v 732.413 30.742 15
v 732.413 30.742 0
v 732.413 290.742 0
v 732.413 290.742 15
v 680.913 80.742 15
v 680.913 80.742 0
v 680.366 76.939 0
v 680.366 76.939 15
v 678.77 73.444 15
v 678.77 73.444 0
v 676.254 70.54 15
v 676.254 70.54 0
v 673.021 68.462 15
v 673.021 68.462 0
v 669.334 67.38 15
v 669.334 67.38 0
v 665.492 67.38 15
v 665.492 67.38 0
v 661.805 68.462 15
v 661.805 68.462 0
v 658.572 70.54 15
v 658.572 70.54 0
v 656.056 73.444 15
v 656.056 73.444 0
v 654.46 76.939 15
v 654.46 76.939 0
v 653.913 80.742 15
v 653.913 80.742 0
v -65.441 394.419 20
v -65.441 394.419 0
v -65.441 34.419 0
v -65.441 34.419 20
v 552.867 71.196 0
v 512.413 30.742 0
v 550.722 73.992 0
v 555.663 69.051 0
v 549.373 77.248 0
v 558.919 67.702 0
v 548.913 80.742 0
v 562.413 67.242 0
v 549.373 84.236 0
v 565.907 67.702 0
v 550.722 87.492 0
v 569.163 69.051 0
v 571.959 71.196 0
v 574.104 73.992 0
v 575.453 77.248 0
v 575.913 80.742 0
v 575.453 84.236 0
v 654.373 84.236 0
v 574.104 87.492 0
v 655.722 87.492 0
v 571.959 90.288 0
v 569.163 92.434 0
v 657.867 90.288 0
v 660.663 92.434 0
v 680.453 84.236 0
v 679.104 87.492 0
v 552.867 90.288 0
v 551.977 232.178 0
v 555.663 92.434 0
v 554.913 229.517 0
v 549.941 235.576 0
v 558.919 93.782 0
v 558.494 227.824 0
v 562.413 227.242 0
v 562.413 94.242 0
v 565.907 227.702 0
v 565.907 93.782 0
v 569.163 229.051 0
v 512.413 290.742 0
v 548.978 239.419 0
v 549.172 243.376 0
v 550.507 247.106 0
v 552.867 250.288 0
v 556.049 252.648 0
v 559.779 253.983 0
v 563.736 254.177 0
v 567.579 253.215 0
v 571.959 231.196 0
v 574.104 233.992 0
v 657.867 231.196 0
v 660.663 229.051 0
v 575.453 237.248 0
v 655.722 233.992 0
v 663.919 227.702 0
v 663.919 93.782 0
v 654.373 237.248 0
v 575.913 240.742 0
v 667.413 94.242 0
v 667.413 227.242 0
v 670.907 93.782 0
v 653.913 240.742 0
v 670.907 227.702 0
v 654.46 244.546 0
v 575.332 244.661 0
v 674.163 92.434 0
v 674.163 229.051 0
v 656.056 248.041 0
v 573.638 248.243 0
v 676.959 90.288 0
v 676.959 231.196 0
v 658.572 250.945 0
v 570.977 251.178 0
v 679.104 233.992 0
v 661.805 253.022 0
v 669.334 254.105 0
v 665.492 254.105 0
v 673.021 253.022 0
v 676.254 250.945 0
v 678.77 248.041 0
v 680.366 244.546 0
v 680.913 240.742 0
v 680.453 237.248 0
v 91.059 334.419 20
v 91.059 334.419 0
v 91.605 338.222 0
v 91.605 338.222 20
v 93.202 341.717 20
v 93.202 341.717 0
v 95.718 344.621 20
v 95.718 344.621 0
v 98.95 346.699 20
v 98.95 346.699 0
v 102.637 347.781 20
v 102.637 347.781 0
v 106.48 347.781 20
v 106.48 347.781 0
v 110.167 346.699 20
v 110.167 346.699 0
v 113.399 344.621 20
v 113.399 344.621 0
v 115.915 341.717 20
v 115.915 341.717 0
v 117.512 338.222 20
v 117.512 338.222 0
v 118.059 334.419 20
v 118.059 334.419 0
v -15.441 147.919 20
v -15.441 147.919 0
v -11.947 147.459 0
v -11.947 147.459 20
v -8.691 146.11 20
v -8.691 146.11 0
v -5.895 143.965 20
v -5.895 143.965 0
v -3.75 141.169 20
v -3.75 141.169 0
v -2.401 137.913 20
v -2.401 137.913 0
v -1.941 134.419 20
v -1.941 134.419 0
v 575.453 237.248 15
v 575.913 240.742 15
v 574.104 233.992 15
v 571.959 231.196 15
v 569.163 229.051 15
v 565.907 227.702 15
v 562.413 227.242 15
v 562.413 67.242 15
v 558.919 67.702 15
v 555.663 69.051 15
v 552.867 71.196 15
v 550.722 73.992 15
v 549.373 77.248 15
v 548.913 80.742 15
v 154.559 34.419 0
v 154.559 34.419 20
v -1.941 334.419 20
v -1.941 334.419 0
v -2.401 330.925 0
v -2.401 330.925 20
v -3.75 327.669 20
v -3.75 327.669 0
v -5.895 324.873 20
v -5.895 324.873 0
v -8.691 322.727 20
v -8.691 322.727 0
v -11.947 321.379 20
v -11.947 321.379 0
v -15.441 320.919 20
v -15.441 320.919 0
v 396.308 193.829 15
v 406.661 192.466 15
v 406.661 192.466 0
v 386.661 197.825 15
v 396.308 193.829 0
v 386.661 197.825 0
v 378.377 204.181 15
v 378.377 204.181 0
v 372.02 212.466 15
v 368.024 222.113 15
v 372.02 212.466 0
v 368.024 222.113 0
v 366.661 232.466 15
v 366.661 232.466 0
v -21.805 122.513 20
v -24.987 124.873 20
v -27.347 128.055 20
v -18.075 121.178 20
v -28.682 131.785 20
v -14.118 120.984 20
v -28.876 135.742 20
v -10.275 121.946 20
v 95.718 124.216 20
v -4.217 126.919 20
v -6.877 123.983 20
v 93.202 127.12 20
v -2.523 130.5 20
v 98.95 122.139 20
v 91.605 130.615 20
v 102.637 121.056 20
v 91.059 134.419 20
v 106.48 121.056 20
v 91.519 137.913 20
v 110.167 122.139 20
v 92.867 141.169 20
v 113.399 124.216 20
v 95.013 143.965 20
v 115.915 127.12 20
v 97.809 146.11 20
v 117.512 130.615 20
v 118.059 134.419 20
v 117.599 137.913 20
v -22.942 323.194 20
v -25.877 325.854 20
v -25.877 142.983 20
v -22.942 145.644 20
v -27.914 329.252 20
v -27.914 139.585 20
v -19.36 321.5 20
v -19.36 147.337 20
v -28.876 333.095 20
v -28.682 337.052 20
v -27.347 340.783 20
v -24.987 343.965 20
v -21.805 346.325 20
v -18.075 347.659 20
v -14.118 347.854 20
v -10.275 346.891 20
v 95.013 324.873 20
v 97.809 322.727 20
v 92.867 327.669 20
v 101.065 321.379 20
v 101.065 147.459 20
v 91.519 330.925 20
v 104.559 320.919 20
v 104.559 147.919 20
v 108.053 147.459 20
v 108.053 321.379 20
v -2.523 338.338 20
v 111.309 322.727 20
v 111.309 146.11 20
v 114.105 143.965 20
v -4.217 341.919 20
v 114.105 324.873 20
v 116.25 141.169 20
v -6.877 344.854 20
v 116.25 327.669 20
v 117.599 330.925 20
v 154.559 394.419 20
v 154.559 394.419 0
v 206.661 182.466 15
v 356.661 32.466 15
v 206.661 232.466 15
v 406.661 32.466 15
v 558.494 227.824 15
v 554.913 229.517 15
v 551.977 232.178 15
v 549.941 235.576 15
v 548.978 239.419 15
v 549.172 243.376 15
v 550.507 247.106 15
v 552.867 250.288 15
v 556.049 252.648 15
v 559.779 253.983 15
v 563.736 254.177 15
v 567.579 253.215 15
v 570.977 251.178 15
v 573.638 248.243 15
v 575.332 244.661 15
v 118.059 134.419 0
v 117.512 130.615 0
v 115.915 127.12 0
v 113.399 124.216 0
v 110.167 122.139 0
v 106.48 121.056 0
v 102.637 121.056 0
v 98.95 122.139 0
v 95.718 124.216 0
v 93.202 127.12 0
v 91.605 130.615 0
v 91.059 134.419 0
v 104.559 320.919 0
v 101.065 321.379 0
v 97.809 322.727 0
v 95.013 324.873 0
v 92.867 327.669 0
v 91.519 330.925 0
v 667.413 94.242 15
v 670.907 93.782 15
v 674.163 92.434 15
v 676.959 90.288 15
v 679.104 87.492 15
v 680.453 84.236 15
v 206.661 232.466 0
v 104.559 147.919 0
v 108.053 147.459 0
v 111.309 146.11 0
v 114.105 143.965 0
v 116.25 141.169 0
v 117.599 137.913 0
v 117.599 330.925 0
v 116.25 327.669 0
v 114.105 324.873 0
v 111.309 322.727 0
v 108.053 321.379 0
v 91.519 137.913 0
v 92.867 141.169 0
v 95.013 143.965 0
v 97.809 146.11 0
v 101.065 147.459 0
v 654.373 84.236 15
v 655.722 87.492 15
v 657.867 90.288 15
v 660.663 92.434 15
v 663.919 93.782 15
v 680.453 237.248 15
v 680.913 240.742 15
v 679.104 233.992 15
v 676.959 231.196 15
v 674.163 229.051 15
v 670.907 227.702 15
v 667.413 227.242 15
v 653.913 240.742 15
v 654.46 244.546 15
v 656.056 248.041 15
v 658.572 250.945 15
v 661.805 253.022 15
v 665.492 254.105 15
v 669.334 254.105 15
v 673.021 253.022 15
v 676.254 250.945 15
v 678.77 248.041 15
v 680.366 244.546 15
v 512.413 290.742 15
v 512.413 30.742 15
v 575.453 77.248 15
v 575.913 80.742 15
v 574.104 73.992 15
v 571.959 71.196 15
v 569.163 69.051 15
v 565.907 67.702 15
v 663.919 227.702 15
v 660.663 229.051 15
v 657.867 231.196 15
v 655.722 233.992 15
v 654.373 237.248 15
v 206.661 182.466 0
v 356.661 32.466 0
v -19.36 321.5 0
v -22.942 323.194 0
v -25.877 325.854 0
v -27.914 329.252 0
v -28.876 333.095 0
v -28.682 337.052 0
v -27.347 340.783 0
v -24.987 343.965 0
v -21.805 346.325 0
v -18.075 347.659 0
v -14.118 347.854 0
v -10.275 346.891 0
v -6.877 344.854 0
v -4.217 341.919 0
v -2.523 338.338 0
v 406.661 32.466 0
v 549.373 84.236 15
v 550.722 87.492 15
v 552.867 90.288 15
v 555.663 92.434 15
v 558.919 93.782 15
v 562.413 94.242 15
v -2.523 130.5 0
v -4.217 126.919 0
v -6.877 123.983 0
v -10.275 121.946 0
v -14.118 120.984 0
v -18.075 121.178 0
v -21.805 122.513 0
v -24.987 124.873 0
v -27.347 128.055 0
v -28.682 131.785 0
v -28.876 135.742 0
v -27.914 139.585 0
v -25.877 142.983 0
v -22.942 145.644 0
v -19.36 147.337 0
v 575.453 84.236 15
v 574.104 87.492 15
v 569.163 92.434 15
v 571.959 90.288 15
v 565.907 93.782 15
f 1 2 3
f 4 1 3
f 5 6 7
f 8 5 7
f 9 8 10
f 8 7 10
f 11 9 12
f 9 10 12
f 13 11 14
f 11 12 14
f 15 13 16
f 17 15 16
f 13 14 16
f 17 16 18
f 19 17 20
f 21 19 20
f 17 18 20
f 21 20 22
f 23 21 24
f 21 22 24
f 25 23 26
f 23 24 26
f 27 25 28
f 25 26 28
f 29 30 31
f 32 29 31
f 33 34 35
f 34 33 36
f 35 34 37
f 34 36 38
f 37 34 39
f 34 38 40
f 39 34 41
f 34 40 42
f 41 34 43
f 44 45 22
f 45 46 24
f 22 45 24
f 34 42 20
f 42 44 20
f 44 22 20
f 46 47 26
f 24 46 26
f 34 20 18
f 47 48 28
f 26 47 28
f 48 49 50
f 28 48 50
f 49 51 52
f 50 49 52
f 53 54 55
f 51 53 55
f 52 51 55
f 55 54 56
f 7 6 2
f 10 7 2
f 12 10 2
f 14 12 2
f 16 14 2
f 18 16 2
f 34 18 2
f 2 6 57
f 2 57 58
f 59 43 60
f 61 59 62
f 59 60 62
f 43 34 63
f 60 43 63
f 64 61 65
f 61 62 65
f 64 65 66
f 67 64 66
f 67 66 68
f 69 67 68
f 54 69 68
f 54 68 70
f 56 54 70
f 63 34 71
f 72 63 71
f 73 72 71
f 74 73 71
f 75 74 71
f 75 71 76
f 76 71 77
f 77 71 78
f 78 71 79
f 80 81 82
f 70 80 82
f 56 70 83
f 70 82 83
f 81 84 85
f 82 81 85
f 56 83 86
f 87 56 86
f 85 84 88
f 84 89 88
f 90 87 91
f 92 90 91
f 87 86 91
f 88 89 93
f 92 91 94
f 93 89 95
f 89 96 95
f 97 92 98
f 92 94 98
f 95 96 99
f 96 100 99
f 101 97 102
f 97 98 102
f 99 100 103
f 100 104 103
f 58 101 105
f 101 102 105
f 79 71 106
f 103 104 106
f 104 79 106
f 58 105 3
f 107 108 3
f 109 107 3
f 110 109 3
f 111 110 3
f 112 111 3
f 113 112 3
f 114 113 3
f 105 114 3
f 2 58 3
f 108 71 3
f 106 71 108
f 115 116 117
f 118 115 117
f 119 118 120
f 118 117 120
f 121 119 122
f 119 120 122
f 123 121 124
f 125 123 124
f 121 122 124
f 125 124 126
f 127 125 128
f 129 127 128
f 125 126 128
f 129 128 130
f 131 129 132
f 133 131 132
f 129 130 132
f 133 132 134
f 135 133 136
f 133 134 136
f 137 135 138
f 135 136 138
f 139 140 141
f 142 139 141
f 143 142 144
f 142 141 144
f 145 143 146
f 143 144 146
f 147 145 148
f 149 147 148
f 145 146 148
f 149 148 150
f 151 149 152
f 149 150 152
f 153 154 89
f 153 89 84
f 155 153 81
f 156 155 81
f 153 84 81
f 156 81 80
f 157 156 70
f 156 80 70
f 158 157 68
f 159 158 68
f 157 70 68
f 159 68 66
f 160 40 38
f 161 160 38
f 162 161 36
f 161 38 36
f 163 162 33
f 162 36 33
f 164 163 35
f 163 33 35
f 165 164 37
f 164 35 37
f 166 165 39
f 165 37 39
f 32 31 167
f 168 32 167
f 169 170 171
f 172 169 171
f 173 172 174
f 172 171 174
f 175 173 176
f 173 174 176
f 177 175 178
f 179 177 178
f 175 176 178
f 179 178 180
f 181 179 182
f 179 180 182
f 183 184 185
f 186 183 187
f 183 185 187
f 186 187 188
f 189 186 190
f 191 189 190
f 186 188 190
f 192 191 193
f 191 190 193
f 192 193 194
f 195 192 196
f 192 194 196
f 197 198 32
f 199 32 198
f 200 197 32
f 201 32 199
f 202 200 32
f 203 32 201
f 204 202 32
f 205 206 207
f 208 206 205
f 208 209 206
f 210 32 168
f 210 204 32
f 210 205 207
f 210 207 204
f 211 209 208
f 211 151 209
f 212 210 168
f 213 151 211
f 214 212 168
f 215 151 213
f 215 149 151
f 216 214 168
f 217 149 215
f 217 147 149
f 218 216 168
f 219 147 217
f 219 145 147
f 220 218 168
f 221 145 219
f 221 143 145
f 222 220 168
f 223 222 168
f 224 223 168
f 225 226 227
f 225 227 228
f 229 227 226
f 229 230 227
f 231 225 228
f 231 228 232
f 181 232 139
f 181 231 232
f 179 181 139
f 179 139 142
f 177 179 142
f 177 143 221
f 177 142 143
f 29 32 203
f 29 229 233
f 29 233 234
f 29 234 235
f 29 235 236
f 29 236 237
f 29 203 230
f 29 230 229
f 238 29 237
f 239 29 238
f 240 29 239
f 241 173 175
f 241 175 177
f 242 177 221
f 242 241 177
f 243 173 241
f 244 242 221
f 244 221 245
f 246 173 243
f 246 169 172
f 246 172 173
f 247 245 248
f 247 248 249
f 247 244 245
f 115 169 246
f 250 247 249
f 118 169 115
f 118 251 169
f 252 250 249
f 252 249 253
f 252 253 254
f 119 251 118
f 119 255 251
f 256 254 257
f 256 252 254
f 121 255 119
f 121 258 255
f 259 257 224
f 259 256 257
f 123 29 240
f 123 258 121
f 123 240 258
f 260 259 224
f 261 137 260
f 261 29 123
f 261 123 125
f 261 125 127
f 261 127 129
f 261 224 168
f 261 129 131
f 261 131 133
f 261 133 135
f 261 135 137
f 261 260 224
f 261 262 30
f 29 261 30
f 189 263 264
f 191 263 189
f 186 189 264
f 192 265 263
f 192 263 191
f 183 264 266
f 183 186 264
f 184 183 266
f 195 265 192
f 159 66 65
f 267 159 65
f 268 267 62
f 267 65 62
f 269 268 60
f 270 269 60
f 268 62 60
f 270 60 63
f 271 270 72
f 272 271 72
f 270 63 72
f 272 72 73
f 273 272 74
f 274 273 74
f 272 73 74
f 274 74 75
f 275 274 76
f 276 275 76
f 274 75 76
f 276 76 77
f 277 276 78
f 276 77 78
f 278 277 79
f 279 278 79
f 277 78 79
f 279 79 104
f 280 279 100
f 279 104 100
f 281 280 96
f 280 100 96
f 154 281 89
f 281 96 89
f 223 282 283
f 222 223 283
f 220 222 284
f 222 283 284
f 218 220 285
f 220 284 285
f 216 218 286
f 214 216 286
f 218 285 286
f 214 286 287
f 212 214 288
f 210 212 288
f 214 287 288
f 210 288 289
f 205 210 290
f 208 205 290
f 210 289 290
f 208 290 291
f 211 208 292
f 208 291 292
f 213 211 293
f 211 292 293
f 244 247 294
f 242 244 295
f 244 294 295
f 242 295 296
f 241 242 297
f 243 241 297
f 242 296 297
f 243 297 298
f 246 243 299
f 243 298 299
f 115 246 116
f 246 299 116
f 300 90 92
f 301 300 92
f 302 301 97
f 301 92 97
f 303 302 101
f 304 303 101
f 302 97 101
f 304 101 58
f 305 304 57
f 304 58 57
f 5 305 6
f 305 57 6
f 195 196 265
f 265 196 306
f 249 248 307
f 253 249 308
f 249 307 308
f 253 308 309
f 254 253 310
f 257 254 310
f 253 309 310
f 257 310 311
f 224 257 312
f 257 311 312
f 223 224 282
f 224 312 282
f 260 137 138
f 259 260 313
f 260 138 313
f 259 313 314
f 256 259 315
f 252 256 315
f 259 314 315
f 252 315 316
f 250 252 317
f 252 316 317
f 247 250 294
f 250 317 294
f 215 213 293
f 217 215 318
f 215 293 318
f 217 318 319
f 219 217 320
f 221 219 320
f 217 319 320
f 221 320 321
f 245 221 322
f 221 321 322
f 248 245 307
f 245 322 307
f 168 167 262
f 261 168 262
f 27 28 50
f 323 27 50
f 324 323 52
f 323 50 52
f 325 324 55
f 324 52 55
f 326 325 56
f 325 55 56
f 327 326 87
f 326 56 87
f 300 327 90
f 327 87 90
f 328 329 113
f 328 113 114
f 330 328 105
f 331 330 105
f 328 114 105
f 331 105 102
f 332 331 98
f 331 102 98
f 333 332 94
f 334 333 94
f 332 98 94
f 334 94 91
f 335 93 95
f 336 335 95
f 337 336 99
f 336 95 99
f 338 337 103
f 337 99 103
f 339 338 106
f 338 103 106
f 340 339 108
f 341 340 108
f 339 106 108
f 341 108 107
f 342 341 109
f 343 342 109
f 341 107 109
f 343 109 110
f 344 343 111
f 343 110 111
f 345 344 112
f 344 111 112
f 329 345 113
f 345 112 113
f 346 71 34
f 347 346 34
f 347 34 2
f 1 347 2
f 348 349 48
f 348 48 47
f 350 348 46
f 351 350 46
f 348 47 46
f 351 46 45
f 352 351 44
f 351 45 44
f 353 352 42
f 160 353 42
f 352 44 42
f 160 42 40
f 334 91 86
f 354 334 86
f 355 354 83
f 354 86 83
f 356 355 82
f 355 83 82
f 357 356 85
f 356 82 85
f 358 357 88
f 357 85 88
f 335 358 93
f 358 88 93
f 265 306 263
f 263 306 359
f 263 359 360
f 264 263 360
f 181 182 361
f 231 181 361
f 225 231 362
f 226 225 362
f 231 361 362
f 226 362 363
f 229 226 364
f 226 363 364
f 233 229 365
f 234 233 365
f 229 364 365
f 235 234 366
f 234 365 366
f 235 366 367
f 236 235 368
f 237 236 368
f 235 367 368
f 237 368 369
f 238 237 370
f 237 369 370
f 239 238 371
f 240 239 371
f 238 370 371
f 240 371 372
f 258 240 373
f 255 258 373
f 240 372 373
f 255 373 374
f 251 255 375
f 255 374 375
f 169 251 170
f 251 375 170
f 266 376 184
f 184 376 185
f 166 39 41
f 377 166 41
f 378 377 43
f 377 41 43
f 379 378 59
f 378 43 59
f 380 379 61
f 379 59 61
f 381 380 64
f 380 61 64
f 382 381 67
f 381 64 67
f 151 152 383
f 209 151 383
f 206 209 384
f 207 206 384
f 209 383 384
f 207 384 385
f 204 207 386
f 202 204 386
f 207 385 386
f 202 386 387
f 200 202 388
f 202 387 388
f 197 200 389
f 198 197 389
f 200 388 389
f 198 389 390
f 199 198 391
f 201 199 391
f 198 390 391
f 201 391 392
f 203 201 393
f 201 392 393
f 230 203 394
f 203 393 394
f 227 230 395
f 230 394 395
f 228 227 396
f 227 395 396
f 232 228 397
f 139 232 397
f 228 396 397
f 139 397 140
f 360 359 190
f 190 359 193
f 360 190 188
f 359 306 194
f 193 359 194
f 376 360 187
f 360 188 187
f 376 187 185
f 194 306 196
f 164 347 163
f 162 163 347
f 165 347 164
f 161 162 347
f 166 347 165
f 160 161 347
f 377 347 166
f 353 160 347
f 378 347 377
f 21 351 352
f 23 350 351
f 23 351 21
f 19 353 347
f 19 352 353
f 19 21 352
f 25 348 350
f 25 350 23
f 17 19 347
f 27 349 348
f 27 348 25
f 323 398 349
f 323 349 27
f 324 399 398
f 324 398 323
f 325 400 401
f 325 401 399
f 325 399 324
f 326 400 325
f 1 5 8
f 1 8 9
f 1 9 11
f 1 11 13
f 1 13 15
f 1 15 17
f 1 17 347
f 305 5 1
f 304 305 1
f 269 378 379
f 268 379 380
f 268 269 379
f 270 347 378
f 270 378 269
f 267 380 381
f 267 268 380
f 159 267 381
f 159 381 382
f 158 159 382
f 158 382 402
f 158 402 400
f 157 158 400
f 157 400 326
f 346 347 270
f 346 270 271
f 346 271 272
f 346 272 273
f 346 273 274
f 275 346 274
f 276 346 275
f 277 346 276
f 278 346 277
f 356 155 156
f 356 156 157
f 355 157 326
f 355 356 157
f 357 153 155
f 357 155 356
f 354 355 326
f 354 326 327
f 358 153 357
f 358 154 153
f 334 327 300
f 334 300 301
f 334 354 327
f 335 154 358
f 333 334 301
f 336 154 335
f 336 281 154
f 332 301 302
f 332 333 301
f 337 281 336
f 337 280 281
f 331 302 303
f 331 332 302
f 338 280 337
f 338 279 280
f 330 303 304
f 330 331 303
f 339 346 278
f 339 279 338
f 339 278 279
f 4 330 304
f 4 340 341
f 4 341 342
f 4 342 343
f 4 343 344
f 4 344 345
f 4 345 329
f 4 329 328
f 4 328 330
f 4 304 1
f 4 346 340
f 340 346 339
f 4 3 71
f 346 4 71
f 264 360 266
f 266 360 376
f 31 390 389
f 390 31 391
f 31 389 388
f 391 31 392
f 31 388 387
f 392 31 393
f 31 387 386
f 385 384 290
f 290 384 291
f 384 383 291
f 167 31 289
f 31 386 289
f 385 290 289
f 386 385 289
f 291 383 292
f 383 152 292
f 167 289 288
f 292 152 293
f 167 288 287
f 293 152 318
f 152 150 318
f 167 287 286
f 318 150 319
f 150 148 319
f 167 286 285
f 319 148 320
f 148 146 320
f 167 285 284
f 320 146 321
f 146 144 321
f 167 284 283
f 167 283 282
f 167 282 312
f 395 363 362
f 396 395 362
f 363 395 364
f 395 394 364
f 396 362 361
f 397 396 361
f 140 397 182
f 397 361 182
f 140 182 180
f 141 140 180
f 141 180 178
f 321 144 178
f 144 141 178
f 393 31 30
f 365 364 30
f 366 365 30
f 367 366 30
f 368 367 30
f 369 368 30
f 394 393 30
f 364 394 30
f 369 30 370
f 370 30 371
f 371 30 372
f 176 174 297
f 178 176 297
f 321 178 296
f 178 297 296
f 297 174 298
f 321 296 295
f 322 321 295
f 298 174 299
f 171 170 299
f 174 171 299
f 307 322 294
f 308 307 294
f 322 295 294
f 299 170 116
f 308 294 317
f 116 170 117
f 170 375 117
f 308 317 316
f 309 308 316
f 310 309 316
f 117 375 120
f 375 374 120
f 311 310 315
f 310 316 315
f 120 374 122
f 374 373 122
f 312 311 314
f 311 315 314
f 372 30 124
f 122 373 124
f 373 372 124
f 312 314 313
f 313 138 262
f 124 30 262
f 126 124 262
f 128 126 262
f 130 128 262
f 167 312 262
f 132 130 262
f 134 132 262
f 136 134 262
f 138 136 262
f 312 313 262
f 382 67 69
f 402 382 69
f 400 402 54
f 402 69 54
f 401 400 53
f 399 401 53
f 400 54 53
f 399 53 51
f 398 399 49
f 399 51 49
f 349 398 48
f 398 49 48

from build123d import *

# Parameters (mm, degrees)
F1_DEPTH = 20
F3_DEPTH = 15


with BuildPart() as f1:
    # F0 (on Top) → F1 (new body)
    with BuildSketch(Plane.XY):
        Polygon((-65.4414370656, 394.4187095761), (-65.4414370656, 34.4187095761), (-15.4414370656, 34.4187095761), (154.5585629344, 34.4187095761), (154.5585629344, 394.4187095761), align=None)
        with BuildLine():
            Line((91.0585629344, 134.4187095761), (-1.9414370656, 134.4187095761))
            ThreePointArc((-1.9414370656, 134.4187095761), (-24.9873786116, 124.8727680301), (-15.4414370656, 147.9187095761))
            Line((-15.4414370656, 147.9187095761), (-15.4414370656, 320.9187095761))
            ThreePointArc((-15.4414370656, 320.9187095761), (-24.9873786116, 343.9646511221), (-1.9414370656, 334.4187095761))
            Line((-1.9414370656, 334.4187095761), (91.0585629344, 334.4187095761))
            ThreePointArc((91.0585629344, 334.4187095761), (104.5585629344, 347.9187095761), (118.0585629344, 334.4187095761))
            ThreePointArc((118.0585629344, 334.4187095761), (114.1045044804, 324.8727680301), (104.5585629344, 320.9187095761))
            Line((104.5585629344, 320.9187095761), (104.5585629344, 147.9187095761))
            ThreePointArc((104.5585629344, 147.9187095761), (114.1045044804, 143.9646511221), (118.0585629344, 134.4187095761))
            ThreePointArc((118.0585629344, 134.4187095761), (104.5585629344, 120.9187095761), (91.0585629344, 134.4187095761))
        make_face(mode=Mode.SUBTRACT)
        with BuildLine():
            ThreePointArc((-15.4414370656, 147.9187095761), (-5.8954955196, 143.9646511221), (-1.9414370656, 134.4187095761))
            Line((-1.9414370656, 134.4187095761), (91.0585629344, 134.4187095761))
            ThreePointArc((91.0585629344, 134.4187095761), (95.0126213884, 143.9646511221), (104.5585629344, 147.9187095761))
            Line((104.5585629344, 147.9187095761), (104.5585629344, 320.9187095761))
            ThreePointArc((104.5585629344, 320.9187095761), (95.0126213884, 324.8727680301), (91.0585629344, 334.4187095761))
            Line((91.0585629344, 334.4187095761), (-1.9414370656, 334.4187095761))
            ThreePointArc((-1.9414370656, 334.4187095761), (-5.8954955196, 324.8727680301), (-15.4414370656, 320.9187095761))
            Line((-15.4414370656, 320.9187095761), (-15.4414370656, 147.9187095761))
        make_face()
    extrude(amount=F1_DEPTH)


with BuildPart() as f3:
    # F2 (on Top) → F3 (new body)
    with BuildSketch(Plane.XY):
        with BuildLine():
            Line((206.6609114408, 182.4657000601), (356.6609114408, 32.4657000601))
            Line((356.6609114408, 32.4657000601), (406.6609114408, 32.4657000601))
            Line((406.6609114408, 32.4657000601), (406.6609114408, 192.4657000601))
            ThreePointArc((406.6609114408, 192.4657000601), (378.3766401934, 204.1814288127), (366.6609114408, 232.4657000601))
            Line((366.6609114408, 232.4657000601), (206.6609114408, 232.4657000601))
            Line((206.6609114408, 232.4657000601), (206.6609114408, 182.4657000601))
        make_face()
    extrude(amount=F3_DEPTH)


with BuildPart() as f3b:
    # F2 (on Top) → F3, piece 2 (new body)
    with BuildSketch(Plane.XY):
        with BuildLine():
            ThreePointArc((562.4129056931, 94.2423118502), (571.9588472391, 90.2882533962), (575.9129056931, 80.7423118502))
            Line((575.9129056931, 80.7423118502), (653.9129056931, 80.7423118502))
            ThreePointArc((653.9129056931, 80.7423118502), (657.866964147, 90.2882533962), (667.4129056931, 94.2423118502))
            Line((667.4129056931, 94.2423118502), (667.4129056931, 227.2423118502))
            ThreePointArc((667.4129056931, 227.2423118502), (657.866964147, 231.1963703042), (653.9129056931, 240.7423118502))
            Line((653.9129056931, 240.7423118502), (575.9129056931, 240.7423118502))
            ThreePointArc((575.9129056931, 240.7423118502), (571.9588472391, 231.1963703042), (562.4129056931, 227.2423118502))
            Line((562.4129056931, 227.2423118502), (562.4129056931, 94.2423118502))
        make_face()
        with BuildLine():
            Line((562.4129056931, 67.2423118502), (562.4129056931, 30.7423118502))
            Line((562.4129056931, 30.7423118502), (732.4129056931, 30.7423118502))
            Line((732.4129056931, 30.7423118502), (732.4129056931, 290.7423118502))
            Line((732.4129056931, 290.7423118502), (512.4129056931, 290.7423118502))
            Line((512.4129056931, 290.7423118502), (512.4129056931, 80.7423118502))
            Line((512.4129056931, 80.7423118502), (548.9129056931, 80.7423118502))
            ThreePointArc((548.9129056931, 80.7423118502), (552.866964147, 90.2882533962), (562.4129056931, 94.2423118502))
            Line((562.4129056931, 94.2423118502), (562.4129056931, 227.2423118502))
            ThreePointArc((562.4129056931, 227.2423118502), (552.866964147, 250.2882533962), (575.9129056931, 240.7423118502))
            Line((575.9129056931, 240.7423118502), (653.9129056931, 240.7423118502))
            ThreePointArc((653.9129056931, 240.7423118502), (667.4129056931, 254.2423118502), (680.9129056931, 240.7423118502))
            ThreePointArc((680.9129056931, 240.7423118502), (676.9588472391, 231.1963703042), (667.4129056931, 227.2423118502))
            Line((667.4129056931, 227.2423118502), (667.4129056931, 94.2423118502))
            ThreePointArc((667.4129056931, 94.2423118502), (676.9588472391, 90.2882533962), (680.9129056931, 80.7423118502))
            ThreePointArc((680.9129056931, 80.7423118502), (667.4129056931, 67.2423118502), (653.9129056931, 80.7423118502))
            Line((653.9129056931, 80.7423118502), (575.9129056931, 80.7423118502))
            ThreePointArc((575.9129056931, 80.7423118502), (571.9588472391, 71.1963703042), (562.4129056931, 67.2423118502))
        make_face()
        with BuildLine():
            Line((512.4129056931, 80.7423118502), (512.4129056931, 30.7423118502))
            Line((512.4129056931, 30.7423118502), (562.4129056931, 30.7423118502))
            Line((562.4129056931, 30.7423118502), (562.4129056931, 67.2423118502))
            ThreePointArc((562.4129056931, 67.2423118502), (552.866964147, 71.1963703042), (548.9129056931, 80.7423118502))
            Line((548.9129056931, 80.7423118502), (512.4129056931, 80.7423118502))
        make_face()
    extrude(amount=F3_DEPTH)


solid = Compound([f1.part, f3.part, f3b.part])
